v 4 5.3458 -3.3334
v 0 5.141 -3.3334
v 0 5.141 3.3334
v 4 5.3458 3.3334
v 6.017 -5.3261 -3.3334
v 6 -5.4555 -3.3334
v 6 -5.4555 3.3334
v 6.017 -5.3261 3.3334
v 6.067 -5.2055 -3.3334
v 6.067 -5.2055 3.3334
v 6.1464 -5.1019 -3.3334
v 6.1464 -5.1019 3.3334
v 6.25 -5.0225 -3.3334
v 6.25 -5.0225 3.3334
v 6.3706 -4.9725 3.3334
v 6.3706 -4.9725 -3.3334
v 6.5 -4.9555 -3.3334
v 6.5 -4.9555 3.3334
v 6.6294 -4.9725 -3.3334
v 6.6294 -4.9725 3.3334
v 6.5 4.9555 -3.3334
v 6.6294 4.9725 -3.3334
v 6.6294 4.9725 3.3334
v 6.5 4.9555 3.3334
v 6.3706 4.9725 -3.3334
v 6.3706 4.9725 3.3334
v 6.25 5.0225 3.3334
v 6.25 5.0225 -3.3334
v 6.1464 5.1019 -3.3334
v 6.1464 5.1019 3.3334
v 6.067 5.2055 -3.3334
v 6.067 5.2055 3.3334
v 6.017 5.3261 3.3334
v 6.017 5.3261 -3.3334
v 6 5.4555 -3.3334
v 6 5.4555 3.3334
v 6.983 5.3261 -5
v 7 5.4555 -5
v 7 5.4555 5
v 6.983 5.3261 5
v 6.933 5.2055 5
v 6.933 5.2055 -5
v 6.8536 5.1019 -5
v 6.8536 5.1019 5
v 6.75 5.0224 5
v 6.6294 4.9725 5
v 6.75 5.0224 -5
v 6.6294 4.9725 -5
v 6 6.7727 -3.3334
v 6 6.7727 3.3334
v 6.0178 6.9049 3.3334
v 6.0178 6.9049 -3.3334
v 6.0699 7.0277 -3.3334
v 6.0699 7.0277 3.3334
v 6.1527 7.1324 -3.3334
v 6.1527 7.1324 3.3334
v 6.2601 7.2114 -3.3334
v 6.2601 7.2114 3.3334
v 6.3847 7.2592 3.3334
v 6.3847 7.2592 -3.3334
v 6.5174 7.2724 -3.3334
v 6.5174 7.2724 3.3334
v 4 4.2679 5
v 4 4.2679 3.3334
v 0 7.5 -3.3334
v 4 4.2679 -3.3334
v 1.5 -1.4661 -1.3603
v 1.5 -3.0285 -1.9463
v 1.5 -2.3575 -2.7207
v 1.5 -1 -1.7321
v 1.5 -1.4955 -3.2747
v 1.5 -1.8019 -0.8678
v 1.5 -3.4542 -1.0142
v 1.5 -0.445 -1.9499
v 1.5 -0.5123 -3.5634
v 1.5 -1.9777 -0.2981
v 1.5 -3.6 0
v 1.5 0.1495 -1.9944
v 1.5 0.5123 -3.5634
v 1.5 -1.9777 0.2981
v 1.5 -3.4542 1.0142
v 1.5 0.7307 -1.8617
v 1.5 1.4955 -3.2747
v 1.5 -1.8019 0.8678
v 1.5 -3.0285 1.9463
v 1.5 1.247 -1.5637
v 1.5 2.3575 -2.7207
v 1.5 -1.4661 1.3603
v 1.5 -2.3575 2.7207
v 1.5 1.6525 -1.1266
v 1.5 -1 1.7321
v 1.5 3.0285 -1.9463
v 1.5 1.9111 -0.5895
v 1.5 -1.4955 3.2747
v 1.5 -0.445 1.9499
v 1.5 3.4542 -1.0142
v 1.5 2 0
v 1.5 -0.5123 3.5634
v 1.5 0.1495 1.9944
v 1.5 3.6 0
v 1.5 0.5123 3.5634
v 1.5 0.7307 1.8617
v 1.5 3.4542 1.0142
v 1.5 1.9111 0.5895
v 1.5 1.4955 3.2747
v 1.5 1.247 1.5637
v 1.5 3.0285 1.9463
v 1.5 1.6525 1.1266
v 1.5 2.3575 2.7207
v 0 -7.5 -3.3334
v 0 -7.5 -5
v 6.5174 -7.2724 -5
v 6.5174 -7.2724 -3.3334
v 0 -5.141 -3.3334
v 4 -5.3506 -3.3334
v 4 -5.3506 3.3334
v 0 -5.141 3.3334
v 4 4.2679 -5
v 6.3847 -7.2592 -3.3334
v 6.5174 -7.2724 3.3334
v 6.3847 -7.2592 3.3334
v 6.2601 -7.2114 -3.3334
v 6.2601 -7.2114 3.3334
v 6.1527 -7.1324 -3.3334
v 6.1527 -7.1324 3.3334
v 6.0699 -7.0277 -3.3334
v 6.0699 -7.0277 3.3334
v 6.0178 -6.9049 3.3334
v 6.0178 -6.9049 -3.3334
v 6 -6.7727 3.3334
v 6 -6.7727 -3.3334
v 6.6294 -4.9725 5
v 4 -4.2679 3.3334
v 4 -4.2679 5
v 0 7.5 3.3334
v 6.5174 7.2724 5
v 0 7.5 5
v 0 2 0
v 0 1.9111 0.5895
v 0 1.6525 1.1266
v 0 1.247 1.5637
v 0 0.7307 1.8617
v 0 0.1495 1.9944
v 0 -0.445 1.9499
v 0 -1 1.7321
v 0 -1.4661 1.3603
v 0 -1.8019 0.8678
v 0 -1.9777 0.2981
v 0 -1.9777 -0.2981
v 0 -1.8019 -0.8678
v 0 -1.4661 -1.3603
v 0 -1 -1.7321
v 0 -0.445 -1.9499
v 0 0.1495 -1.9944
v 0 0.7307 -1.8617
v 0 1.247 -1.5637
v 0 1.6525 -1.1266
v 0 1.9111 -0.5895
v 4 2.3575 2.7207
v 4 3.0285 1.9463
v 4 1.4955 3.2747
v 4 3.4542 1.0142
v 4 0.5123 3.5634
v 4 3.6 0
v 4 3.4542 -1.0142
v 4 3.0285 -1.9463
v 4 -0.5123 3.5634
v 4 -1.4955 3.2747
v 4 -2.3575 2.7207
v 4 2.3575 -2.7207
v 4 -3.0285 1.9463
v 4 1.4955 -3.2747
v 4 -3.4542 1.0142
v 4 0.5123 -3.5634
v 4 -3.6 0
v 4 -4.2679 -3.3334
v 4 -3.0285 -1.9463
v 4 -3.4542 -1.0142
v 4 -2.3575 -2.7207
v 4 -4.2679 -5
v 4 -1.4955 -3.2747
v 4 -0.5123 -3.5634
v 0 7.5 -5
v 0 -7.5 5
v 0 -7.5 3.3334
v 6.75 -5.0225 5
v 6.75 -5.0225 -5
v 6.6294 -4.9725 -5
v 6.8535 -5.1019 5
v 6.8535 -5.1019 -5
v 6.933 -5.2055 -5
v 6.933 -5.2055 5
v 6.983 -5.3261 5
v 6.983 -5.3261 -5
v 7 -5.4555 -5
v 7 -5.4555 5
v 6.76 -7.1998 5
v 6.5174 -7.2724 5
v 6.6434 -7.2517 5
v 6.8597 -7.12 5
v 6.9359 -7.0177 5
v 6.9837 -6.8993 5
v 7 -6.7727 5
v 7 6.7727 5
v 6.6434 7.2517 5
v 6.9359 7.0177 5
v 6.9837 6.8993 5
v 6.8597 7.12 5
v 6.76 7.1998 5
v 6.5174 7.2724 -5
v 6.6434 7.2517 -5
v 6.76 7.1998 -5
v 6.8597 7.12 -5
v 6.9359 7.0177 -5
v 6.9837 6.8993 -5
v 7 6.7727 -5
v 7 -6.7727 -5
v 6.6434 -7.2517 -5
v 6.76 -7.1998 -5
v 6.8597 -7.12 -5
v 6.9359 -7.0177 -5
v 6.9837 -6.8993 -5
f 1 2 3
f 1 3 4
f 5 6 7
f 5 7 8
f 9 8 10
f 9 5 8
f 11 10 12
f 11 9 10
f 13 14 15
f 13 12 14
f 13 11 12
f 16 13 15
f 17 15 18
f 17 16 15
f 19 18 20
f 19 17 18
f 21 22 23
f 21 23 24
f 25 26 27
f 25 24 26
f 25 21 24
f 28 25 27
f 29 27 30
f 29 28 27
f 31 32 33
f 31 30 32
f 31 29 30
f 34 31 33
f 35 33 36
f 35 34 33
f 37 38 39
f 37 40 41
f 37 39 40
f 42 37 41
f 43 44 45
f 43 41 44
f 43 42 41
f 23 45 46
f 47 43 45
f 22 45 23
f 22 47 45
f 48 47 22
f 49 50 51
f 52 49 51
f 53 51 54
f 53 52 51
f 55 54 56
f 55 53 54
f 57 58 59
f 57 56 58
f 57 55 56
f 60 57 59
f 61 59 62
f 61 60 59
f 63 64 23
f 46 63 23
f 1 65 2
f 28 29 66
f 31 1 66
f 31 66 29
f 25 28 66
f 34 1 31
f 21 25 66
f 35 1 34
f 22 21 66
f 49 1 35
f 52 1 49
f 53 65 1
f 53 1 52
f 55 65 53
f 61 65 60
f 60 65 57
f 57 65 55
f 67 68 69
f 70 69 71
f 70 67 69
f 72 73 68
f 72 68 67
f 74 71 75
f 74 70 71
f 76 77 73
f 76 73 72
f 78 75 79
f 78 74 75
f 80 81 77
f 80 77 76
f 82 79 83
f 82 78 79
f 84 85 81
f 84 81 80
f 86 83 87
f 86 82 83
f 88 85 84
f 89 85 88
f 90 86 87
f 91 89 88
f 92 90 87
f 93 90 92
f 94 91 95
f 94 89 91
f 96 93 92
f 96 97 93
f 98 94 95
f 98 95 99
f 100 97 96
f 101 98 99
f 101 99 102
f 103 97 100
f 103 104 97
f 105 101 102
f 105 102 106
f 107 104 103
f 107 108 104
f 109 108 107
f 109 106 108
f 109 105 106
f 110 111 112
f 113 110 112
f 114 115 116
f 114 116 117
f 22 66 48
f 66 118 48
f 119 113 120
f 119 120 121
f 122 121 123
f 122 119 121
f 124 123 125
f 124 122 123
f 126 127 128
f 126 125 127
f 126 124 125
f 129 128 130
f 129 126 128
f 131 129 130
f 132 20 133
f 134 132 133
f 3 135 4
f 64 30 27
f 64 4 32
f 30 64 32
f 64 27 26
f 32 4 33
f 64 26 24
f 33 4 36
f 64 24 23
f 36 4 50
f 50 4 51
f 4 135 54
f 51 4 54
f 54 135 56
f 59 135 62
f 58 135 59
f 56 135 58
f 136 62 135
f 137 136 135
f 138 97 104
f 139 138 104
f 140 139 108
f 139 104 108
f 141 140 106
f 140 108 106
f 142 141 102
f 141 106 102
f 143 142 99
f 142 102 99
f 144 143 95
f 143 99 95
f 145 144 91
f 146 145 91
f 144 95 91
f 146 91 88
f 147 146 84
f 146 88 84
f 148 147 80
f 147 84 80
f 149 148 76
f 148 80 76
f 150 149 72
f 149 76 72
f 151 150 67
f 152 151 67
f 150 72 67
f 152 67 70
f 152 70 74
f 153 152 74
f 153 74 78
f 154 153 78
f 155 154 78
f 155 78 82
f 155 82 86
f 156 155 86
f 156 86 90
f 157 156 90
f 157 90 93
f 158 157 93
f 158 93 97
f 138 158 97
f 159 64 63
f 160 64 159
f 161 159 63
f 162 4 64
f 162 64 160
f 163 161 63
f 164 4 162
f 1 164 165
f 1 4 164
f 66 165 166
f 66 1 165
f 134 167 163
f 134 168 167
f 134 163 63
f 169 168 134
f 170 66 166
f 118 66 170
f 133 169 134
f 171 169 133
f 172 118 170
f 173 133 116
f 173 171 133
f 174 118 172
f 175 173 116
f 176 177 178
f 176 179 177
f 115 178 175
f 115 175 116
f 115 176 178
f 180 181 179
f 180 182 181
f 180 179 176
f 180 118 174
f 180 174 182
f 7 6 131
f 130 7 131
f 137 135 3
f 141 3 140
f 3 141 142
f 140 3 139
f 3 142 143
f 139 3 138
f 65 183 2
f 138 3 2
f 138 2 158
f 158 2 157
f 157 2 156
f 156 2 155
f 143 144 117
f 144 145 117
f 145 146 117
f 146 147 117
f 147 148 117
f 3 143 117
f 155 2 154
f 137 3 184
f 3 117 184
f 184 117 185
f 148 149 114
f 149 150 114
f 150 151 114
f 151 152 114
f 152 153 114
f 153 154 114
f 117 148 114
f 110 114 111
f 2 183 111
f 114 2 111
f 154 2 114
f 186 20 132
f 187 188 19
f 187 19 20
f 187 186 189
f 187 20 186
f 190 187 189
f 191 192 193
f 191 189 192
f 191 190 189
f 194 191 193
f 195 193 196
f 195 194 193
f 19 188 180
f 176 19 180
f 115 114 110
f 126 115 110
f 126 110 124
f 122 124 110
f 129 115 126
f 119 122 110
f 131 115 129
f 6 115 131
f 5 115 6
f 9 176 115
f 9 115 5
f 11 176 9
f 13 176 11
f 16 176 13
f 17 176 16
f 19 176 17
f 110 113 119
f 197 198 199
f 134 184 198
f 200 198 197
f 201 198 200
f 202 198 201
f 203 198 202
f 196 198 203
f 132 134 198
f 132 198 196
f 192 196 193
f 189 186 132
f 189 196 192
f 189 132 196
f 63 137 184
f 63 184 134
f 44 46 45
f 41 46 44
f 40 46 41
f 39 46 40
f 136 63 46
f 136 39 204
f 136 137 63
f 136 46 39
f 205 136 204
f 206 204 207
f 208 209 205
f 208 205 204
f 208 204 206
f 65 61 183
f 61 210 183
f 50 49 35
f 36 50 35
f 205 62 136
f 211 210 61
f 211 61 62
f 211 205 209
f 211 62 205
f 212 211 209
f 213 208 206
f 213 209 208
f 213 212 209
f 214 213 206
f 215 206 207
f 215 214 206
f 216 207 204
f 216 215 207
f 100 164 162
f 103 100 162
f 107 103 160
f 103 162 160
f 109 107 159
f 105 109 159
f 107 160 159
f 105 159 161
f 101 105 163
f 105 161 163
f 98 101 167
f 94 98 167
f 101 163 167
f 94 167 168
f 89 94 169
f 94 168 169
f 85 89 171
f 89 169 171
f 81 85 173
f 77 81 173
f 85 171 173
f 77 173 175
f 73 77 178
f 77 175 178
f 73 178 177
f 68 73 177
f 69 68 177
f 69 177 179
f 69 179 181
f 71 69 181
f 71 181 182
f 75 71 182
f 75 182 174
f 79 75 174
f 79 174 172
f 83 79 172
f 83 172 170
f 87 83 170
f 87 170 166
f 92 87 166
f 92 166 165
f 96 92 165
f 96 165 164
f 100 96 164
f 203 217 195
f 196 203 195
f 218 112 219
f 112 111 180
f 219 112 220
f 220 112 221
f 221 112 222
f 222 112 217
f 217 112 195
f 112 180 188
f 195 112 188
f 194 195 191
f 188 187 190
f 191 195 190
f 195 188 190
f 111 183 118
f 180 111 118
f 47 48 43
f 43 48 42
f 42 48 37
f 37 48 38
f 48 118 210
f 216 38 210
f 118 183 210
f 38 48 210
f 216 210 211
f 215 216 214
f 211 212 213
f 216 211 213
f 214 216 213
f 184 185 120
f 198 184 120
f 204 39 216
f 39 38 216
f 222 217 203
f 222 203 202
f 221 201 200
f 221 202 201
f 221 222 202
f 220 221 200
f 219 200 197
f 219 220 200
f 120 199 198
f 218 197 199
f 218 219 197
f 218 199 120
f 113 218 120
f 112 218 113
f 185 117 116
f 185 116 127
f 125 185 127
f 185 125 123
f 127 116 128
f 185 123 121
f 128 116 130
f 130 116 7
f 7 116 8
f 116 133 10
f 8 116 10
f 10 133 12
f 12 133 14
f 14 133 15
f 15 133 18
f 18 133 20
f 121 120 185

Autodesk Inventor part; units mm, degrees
ref_plane "YZ Plane" through (0, 0, 0) normal (1, 0, 0) x (0, 1, 0)
ref_plane "XZ Plane" through (0, 0, 0) normal (0, 1, 0) x (-1, 0, 0)
ref_plane "XY Plane" through (0, 0, 0) normal (0, 0, 1) x (1, 0, 0)
sketch "Sketch_1" plane through (0, 0, 0) normal (0, 0, 1) x (1, 0, 0)
  line L0 (0, 7.5) -> (0, -7.5)
  line L1 (0, -7.5) -> (6.5174, -7.2724)
  arc A0 (6.5174, -7.2724) -> (7, -6.7727) centre (6.5, -6.7727) ccw
  line L2 (7, -6.7727) -> (7, -5.4555)
  arc A1 (7, -5.4555) -> (6.6294, -4.9725) centre (6.5, -5.4555) ccw
  line L3 (6.6294, -4.9725) -> (4, -4.2679)
  line L4 (4, -4.2679) -> (4, 4.2679)
  line L5 (4, 4.2679) -> (6.6294, 4.9725)
  arc A2 (6.6294, 4.9725) -> (7, 5.4555) centre (6.5, 5.4555) ccw
  line L6 (7, 5.4555) -> (7, 6.7727)
  arc A3 (7, 6.7727) -> (6.5174, 7.2724) centre (6.5, 6.7727) ccw
  line L7 (6.5174, 7.2724) -> (0, 7.5)
  point P0 (0, 0)
  point P1 (0, 0)
  dimension "d11" = 4
extrude "Extrusion1" add sketch "Sketch_1" along normal mid plane 10
sketch "Sketch_3" plane through (0, 0, 0) normal (0, 0, 1) x (1, 0, 0)
  line L0 (0, 8.3333) -> (0, 5.141)
  line L1 (0, 5.141) -> (4, 5.3458)
  line L2 (4, 5.3458) -> (4, 0)
  line L3 (4, 0) -> (8, 0)
  line L4 (8, 0) -> (8, 8.3333)
  line L5 (8, 8.3333) -> (0, 8.3333)
  arc A0 (6, 5.4555) -> (6.6294, 4.9725) centre (6.5, 5.4555) ccw
  arc A1 (6.6294, 4.9725) -> (7, 5.4555) centre (6.5, 5.4555) ccw
  line L6 (7, 5.4555) -> (7, 6.7727)
  arc A2 (7, 6.7727) -> (6.5174, 7.2724) centre (6.5, 6.7727) ccw
  arc A3 (6.5174, 7.2724) -> (6, 6.7727) centre (6.5, 6.7727) ccw
  line L7 (6, 6.7727) -> (6, 5.4555)
  line L8 (4, -4.2679) -> (4, 4.2679) projected
  line L9 (0, 7.5) -> (0, -7.5) projected
extrude "Extrusion2" cut sketch "Sketch_3" along normal mid plane 6.6667
sketch "Sketch_4" plane through (0, 0, 0) normal (0, 0, 1) x (1, 0, 0)
  line L0 (0, -8.3333) -> (8, -8.3333)
  line L1 (8, -8.3333) -> (8, 0)
  line L2 (8, 0) -> (4, 0)
  line L3 (4, 0) -> (4, -5.3506)
  line L4 (4, -5.3506) -> (0, -5.141)
  line L5 (0, -5.141) -> (0, -8.3333)
  line L6 (6, -5.4555) -> (6, -6.7727)
  arc A0 (6, -6.7727) -> (6.5174, -7.2724) centre (6.5, -6.7727) ccw
  arc A1 (6.5174, -7.2724) -> (7, -6.7727) centre (6.5, -6.7727) ccw
  line L7 (7, -6.7727) -> (7, -5.4555)
  arc A2 (7, -5.4555) -> (6.6294, -4.9725) centre (6.5, -5.4555) ccw
  arc A3 (6.6294, -4.9725) -> (6, -5.4555) centre (6.5, -5.4555) ccw
  line L8 (4, -4.2679) -> (4, 4.2679) projected
  line L9 (0, 7.5) -> (0, -7.5) projected
extrude "Extrusion3" cut sketch "Sketch_4" along normal mid plane 6.6667
sketch "Sketch_5" plane through (0, 0, 0) normal (0, 0, 1) x (1, 0, 0)
  line L0 (4, 0) -> (0, 0)
  line L1 (0, 0) -> (0, 2)
  line L2 (0, 2) -> (1.5, 2)
  line L3 (1.5, 2) -> (1.5, 3.6)
  line L4 (1.5, 3.6) -> (4, 3.6)
  line L5 (4, 3.6) -> (4, 0)
  line L6 (4, 0) -> (0, 0)
  line L7 (7, 5.4555) -> (7, 6.7727) projected
  line L8 (4, -4.2679) -> (4, 4.2679) projected
  line L9 (0, 7.5) -> (0, -7.5) projected
  dimension "d7" = 2
  dimension "d8" = 3.6
  dimension "d9" = 5.5
revolve "Revolution1" cut sketch "Sketch_5" angle 360 about axis through (4, 0, 0) along (1, 0, 0)
properties part number "520022598" material "PA 6.6-MO*Nylatron GS"
